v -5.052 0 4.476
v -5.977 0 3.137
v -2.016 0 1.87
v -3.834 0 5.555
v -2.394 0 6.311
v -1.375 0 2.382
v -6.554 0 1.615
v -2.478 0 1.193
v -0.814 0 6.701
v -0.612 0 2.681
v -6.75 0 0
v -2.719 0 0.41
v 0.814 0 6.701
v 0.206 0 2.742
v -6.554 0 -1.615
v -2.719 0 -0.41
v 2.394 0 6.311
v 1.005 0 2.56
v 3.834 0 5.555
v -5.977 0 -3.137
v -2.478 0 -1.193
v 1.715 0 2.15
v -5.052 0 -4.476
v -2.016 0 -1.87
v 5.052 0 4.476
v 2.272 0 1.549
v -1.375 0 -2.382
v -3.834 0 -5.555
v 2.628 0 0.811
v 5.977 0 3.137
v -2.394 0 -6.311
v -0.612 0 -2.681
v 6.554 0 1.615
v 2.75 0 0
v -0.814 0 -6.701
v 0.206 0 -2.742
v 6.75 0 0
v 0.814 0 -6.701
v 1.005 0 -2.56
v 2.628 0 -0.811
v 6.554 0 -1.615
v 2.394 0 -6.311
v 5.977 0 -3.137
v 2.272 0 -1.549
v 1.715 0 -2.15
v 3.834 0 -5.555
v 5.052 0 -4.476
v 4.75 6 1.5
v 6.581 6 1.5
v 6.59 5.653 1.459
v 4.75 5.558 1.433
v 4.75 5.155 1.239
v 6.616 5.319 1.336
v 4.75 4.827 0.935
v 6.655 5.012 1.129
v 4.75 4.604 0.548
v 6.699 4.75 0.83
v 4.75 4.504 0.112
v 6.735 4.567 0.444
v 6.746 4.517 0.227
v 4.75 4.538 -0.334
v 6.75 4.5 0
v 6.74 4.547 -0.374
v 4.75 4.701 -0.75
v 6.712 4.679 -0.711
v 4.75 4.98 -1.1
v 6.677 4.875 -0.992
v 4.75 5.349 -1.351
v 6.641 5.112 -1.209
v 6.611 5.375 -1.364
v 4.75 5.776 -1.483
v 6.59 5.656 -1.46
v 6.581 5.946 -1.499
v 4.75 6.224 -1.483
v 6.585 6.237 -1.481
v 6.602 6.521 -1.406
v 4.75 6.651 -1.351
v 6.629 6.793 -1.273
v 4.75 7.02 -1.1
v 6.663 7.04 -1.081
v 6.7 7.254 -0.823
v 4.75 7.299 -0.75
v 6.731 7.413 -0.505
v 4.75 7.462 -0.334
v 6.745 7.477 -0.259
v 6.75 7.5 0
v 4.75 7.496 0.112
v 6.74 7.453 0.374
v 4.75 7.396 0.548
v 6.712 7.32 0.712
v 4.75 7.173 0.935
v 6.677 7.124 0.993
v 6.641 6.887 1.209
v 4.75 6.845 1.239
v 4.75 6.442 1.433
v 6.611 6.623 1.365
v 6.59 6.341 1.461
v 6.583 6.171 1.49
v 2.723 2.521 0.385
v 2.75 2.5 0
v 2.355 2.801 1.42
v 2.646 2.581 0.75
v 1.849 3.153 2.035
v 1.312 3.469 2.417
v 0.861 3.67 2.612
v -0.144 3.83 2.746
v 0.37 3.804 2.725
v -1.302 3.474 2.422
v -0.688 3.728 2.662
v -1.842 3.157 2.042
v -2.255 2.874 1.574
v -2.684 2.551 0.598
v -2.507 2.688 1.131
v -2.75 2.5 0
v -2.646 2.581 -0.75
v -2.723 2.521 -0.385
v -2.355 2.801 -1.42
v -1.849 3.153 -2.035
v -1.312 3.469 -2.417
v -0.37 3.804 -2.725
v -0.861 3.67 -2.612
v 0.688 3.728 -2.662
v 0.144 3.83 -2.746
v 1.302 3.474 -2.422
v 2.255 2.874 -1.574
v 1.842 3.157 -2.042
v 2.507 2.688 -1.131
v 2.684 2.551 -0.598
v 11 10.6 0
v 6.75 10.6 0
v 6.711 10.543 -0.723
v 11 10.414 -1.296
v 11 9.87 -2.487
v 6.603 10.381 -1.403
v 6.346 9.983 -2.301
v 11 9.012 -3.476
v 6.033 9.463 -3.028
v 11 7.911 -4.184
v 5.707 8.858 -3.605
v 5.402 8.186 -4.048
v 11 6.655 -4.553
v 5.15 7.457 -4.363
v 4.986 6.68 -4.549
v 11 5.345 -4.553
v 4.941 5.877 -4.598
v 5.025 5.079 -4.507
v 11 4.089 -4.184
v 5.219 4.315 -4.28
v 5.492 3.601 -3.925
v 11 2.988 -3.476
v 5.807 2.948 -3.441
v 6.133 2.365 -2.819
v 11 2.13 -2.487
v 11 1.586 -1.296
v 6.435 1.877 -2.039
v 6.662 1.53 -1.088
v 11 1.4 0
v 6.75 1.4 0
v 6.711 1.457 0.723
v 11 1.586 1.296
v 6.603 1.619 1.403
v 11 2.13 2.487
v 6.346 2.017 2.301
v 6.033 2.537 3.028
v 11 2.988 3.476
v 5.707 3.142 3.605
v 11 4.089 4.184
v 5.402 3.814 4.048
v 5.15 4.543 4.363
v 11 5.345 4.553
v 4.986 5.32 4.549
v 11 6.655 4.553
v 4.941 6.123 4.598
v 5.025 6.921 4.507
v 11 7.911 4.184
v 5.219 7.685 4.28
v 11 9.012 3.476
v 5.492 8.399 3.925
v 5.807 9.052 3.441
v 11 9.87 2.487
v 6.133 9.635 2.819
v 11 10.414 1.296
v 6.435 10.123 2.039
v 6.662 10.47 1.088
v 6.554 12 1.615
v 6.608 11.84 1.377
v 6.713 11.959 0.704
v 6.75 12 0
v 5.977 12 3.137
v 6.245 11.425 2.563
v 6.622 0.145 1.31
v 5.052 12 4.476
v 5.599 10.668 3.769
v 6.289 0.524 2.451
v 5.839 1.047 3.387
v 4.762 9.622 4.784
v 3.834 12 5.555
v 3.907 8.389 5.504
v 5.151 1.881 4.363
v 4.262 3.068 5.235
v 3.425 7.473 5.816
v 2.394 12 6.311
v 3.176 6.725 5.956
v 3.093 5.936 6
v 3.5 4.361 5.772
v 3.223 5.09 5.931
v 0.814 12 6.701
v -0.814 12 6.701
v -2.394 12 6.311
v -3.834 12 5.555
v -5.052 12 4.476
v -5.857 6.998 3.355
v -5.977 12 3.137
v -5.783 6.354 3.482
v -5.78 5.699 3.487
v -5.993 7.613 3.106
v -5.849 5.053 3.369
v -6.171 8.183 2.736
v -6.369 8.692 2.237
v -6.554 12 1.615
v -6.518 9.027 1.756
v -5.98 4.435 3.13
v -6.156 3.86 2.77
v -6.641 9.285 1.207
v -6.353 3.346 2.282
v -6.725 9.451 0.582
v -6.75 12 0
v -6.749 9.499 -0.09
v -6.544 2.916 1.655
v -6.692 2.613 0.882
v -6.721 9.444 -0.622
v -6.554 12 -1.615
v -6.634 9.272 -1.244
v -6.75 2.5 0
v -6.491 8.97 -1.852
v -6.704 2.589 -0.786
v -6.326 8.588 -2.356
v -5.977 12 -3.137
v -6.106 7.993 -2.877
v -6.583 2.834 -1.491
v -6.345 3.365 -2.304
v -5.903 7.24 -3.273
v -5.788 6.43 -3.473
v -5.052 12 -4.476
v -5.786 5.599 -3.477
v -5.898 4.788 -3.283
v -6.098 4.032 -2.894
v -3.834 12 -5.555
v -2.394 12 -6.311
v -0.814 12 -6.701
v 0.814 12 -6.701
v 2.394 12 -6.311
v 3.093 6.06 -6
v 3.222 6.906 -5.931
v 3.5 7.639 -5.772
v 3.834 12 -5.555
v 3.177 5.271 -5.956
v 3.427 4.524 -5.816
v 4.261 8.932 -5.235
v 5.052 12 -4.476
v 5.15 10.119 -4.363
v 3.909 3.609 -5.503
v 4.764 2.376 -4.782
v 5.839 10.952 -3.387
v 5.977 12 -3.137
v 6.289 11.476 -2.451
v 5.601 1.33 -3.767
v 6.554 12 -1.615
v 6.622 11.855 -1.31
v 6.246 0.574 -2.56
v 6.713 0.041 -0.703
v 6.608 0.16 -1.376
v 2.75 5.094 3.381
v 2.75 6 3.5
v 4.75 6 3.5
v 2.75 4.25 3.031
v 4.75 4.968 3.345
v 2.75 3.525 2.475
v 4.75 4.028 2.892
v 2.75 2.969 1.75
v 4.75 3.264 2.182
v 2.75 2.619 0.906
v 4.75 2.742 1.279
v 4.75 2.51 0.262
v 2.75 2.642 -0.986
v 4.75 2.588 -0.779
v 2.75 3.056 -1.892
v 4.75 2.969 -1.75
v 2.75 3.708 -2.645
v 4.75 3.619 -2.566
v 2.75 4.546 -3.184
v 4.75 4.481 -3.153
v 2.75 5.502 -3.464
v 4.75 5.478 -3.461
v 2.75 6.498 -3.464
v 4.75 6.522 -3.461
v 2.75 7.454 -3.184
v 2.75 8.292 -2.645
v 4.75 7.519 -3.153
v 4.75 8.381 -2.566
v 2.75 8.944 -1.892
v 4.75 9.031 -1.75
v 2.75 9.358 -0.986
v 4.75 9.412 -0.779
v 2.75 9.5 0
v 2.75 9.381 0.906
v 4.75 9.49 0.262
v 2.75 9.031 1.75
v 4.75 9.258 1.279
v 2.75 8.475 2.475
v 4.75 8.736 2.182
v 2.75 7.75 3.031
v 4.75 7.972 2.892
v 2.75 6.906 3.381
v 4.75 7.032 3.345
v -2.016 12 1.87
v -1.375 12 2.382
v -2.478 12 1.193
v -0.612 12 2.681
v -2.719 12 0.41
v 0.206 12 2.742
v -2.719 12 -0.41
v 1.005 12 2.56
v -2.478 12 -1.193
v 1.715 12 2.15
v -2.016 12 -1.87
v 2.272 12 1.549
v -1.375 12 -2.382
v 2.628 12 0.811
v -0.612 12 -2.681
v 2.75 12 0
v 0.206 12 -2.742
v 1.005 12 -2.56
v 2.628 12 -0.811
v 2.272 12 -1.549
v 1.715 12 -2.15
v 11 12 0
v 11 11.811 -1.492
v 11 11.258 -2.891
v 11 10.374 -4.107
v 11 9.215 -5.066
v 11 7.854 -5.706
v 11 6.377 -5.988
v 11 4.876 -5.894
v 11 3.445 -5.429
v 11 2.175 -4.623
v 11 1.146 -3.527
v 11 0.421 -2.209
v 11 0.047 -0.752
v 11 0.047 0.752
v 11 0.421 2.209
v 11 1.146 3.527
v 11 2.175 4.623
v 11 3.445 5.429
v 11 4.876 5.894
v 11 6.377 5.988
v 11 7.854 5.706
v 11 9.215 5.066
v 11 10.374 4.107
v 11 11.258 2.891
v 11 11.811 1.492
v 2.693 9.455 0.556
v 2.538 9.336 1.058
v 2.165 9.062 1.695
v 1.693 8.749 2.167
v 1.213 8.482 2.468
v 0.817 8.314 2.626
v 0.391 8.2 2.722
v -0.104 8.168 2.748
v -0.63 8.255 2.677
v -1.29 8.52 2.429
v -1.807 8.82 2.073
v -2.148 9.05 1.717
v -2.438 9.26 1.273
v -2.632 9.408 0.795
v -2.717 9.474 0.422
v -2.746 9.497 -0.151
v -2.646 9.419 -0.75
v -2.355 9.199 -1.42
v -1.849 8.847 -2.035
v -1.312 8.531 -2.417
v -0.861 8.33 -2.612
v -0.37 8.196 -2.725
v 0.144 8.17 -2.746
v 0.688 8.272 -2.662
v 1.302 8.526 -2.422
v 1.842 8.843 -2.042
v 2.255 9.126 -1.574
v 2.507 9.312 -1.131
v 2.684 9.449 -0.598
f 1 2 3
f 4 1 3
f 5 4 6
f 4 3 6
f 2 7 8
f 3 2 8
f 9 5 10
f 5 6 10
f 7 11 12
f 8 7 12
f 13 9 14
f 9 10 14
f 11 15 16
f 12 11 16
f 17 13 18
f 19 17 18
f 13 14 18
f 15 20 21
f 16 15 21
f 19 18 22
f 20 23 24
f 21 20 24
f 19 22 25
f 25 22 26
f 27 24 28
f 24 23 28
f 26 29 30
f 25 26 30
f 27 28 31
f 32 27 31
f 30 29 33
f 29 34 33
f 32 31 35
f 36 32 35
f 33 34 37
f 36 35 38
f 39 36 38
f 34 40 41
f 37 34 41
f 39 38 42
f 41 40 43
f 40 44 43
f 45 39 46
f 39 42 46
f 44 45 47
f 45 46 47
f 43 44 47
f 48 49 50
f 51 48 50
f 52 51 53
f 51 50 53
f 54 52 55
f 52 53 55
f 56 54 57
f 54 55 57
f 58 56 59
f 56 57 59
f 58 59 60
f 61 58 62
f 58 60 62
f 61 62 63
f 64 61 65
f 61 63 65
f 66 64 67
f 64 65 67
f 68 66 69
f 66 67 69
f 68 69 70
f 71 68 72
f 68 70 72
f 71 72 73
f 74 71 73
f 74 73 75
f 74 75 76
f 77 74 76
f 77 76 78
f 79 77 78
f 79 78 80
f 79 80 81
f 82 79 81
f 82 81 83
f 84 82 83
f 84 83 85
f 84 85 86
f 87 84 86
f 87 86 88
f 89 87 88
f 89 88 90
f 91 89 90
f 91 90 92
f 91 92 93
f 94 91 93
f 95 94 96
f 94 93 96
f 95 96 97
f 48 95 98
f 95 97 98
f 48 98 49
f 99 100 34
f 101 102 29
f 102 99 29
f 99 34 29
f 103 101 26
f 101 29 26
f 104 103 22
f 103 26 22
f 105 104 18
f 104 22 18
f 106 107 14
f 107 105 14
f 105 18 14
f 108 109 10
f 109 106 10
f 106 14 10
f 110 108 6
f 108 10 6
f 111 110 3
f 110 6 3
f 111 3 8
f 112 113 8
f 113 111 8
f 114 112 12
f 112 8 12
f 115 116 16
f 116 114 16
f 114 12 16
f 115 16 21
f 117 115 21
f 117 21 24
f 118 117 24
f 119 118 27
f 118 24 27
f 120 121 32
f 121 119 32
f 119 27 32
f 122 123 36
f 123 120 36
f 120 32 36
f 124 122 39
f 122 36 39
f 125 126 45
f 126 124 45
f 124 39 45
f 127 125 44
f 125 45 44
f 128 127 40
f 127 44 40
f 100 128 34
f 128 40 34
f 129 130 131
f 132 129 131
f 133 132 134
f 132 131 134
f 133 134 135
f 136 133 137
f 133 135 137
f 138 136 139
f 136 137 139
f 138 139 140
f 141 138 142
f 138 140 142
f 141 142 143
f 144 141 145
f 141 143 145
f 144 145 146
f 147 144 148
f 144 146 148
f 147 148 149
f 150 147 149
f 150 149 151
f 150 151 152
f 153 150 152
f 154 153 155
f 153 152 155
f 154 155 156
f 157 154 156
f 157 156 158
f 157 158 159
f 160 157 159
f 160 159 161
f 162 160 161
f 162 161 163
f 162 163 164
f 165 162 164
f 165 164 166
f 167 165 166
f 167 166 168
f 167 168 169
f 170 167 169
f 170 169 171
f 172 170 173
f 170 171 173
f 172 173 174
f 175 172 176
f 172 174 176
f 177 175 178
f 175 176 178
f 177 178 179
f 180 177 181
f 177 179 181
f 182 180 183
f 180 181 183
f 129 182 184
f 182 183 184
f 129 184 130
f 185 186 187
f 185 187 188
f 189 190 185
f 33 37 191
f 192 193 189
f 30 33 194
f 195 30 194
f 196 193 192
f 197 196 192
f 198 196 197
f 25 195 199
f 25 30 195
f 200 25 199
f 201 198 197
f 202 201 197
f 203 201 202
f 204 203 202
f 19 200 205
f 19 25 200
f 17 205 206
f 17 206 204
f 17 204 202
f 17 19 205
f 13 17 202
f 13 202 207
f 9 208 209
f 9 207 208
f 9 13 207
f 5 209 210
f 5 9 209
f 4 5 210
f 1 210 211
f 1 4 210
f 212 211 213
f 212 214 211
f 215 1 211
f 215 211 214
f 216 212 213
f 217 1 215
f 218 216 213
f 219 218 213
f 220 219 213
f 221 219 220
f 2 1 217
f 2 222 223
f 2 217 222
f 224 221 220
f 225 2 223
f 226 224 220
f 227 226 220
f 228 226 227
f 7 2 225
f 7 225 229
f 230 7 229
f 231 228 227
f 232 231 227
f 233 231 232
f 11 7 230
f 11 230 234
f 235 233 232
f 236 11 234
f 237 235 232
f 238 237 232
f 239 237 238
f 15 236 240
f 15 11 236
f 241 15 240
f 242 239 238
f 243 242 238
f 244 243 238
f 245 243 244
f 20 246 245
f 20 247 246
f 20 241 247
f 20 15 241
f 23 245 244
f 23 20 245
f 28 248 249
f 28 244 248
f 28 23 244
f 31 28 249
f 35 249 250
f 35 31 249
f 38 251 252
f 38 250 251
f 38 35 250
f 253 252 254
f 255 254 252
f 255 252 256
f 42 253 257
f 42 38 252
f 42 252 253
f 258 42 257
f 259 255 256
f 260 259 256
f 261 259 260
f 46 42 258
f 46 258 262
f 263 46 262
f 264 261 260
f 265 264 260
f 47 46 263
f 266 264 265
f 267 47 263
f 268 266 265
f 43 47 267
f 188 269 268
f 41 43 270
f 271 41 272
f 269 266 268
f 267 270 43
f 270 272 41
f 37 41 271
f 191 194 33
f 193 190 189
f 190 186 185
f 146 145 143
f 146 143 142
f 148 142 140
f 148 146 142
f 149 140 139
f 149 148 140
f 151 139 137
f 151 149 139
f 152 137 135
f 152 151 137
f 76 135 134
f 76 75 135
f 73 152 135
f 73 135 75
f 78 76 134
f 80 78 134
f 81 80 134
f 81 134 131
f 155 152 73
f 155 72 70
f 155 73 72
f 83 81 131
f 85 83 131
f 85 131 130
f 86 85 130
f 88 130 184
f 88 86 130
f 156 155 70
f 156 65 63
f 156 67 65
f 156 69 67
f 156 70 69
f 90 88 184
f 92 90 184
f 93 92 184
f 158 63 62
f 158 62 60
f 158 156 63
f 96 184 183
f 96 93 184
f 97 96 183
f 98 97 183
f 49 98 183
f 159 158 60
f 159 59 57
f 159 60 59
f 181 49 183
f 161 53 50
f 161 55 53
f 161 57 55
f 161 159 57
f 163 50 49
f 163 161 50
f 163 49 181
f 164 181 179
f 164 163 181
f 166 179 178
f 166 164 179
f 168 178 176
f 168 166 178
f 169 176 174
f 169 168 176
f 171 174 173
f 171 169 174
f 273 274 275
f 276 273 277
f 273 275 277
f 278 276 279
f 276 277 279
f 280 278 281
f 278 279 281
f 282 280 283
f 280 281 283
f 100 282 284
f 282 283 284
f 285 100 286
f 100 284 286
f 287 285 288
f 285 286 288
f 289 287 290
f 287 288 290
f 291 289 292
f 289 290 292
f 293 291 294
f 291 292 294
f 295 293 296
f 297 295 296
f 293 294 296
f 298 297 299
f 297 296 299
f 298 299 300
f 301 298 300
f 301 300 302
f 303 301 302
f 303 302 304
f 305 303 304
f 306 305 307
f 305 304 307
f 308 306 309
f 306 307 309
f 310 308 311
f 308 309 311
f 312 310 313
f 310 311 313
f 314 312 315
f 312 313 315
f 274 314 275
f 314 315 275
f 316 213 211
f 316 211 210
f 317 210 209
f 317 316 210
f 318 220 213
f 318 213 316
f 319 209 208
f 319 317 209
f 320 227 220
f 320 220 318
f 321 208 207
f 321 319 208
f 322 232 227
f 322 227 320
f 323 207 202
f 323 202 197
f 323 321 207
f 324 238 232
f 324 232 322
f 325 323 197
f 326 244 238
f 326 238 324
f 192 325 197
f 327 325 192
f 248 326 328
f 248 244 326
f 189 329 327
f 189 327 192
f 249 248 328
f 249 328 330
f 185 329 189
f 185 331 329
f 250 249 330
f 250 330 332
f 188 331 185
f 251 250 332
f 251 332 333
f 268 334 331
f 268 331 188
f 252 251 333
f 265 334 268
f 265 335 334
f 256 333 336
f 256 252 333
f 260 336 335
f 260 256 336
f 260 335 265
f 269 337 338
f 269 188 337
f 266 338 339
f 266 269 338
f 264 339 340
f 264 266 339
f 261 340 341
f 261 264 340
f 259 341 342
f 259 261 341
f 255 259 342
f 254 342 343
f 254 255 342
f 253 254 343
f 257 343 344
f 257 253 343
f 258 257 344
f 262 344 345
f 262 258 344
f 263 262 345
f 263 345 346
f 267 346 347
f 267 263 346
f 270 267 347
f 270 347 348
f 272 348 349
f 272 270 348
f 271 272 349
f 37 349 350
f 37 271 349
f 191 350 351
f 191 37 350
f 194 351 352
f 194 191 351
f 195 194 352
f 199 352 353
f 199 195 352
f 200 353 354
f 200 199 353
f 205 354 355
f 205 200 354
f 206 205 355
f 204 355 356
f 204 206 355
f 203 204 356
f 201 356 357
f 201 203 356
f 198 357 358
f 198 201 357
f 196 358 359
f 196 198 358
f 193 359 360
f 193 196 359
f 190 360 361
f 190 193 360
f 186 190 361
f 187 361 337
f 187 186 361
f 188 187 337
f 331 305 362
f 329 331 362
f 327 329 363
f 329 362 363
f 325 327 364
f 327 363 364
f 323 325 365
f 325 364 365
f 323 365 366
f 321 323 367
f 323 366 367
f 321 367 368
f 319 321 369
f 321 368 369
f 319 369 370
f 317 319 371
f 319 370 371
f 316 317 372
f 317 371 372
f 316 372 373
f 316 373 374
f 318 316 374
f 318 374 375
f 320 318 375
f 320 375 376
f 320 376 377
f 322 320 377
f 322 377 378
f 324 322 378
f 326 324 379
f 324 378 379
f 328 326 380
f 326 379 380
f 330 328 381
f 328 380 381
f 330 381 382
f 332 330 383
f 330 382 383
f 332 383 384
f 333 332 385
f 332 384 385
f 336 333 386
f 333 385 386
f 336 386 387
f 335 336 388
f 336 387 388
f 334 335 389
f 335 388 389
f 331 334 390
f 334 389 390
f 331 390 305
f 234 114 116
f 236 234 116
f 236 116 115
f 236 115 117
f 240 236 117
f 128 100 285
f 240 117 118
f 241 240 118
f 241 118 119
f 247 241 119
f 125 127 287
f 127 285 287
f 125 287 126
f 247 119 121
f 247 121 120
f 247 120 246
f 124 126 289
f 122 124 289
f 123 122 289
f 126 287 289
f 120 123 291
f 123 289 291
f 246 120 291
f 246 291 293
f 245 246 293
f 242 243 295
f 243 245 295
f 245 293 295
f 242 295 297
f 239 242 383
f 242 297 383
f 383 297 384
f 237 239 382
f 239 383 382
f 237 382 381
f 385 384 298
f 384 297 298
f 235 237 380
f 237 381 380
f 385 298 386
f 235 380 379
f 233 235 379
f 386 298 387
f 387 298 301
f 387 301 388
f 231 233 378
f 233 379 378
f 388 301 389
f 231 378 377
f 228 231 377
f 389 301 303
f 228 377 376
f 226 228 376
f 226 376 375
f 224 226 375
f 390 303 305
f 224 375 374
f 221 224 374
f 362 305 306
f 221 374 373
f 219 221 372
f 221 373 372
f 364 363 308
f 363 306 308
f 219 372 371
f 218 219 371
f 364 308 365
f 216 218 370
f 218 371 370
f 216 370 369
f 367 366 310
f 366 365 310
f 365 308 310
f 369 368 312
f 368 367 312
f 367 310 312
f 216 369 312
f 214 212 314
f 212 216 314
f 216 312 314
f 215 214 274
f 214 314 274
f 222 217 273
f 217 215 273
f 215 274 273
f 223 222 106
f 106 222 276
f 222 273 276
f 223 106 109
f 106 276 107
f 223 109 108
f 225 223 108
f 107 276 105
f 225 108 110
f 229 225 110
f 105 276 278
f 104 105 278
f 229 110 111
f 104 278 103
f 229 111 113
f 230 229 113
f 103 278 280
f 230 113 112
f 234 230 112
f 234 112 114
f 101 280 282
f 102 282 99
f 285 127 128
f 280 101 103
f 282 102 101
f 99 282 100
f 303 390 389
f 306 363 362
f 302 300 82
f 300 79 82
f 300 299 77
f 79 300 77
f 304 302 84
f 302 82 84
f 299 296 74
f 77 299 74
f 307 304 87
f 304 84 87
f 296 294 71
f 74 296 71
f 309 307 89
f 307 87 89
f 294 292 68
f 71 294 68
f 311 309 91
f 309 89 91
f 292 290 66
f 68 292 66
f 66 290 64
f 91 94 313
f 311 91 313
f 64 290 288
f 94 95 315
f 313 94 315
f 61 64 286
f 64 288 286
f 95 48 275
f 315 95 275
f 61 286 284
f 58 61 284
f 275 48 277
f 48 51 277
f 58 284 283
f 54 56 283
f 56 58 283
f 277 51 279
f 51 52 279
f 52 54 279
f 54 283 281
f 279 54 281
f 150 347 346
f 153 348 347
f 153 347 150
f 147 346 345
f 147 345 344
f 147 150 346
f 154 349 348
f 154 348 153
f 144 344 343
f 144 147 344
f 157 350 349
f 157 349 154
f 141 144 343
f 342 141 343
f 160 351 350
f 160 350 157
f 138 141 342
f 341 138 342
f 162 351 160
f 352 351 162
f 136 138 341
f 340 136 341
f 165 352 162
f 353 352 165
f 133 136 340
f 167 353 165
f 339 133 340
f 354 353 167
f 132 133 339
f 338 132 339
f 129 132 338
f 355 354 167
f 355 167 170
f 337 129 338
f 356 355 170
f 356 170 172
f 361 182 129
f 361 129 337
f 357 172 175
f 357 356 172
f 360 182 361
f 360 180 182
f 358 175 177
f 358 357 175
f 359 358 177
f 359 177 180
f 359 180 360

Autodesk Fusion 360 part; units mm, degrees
sketch "Sketch1" plane through (0, 0, 0) normal (0, 1, 0) x (1, 0, 0)
  circle A0 centre (0, 0) radius 2.75
  circle A1 centre (0, 0) radius 6.75
  dimension "d1" = 5.5
  dimension "d2" = 4
extrude "Extrude1" add sketch "Sketch1" along normal blind 12
ref_plane "WorkPlane1" through (3, 0, 0) normal (1, 0, 0) x (0, 1, 0)
sketch "Sketch2" plane through (3, 0, 0) normal (1, 0, 0) x (0, 1, 0)
  line L0 (12, -6.75) -> (12, 6.75)
  line L1 (0, -6.75) -> (0, 6.75)
  circle A0 centre (6, 0) radius 4.6
  circle A1 centre (6, 0) radius 6
  dimension "d6" = 9.2
  dimension "d7" = 6
  dimension "d8" = 12
  dimension "d9" = 1.4
extrude "Extrude2" add sketch "Sketch2" along normal blind 8
ref_plane "WorkPlane2" through (2.75, 6.403, 0) normal (-1, 0, 0) x (0, 0, -1)
sketch "Sketch3" plane through (2.75, 6.403, 0) normal (-1, 0, 0) x (0, -1, 0)
  line L0 (-5.597, -2.75) -> (-5.597, 2.75)
  line L1 (6.403, -2.75) -> (6.403, 2.75)
  line L2 (6.403, -2.75) -> (6.403, 2.75)
  line L3 (-5.597, -2.75) -> (-5.597, 2.75)
  circle A0 centre (0.403, 0) radius 3.5
  point P0 (0.403, 0)
  dimension "d13" = 6
  dimension "d14" = 12
  dimension "d20" = 7
hole "Hole1" at (2.75, 6, 0) direction (1, 0, 0) diameter 3 depth 10 tip angle 118 counterbore diameter 7 counterbore depth 2
extrude "Extrude3" cut sketch "Sketch3" along normal blind 14.5
equation "d1 = 5 mm + 0.5 mm"
equation "d6 = 9 mm + 0.2 mm"
equation "d7 = d8 / 2"
equation "d13 = d14 / 2"
